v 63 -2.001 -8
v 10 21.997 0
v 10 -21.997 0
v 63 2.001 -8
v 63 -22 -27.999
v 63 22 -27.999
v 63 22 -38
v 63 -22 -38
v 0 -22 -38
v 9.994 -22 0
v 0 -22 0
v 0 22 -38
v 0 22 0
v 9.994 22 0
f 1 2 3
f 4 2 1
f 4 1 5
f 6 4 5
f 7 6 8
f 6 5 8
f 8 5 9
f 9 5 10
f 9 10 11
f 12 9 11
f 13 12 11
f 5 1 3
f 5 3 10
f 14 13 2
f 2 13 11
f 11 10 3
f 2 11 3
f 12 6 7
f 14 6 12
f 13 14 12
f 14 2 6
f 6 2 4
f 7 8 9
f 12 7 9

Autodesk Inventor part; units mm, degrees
ref_plane "YZ Plane" through (0, 0, 0) normal (1, 0, 0) x (0, 1, 0)
ref_plane "XZ Plane" through (0, 0, 0) normal (0, 1, 0) x (-1, 0, 0)
sketch "草圖1" plane through (0, 0, 0) normal (0, 1, 0) x (-1, 0, 0)
  line L0 (0, 0) -> (-63, 0)
  line L1 (-63, 0) -> (-63, -38)
  line L2 (-63, -38) -> (0, -38)
  line L3 (0, -38) -> (0, 0)
  dimension "d0" = 63
  dimension "d1" = 38
extrude "擠出1" add sketch "草圖1" along normal mid plane 44
sketch "草圖2" plane through (0, 22, 0) normal (0, 1, 0) x (1, 0, 0)
  line L0 (0, 0) -> (63, 0) projected
  line L1 (10, 0) -> (63, 8)
  line L2 (63, 0) -> (63, 38) projected
  dimension "d4" = 10
  dimension "d5" = 30
extrude "擠出2" cut sketch "草圖2" against normal blind 60
sketch "草圖3" plane through (63, -22, -38) normal (1, 0, 0) x (0, 0, -1)
  line L0 (-30, 24) -> (-10, 44)
  line L1 (0, 44) -> (-38, 44) projected
  line L2 (-30, 44) -> (-30, 0) projected
  point P0 (-38, 22)
  point P1 (-30, 2)
  dimension "d8" = 20
  dimension "d9" = 20
ref_plane "工作平面1" through (10, 22, 0) normal (-0.3499, -0.6624, -0.6624) x (0.8842, 0, -0.4671)
sketch "草圖4" plane through (10, 22, 0) normal (-0.3499, -0.6624, -0.6624) x (0.8842, 0, -0.4671)
  line L0 (-15.1543, -12.3218) -> (93.717, -12.3218)
  line L1 (93.717, -12.3218) -> (93.717, 28.8166)
  line L2 (93.717, 28.8166) -> (-15.1543, 28.8166)
  line L3 (-15.1543, 28.8166) -> (-15.1543, -12.3218)
  point P0 (-8.8419, 13.3872)
extrude "擠出3" cut sketch "草圖4" against normal blind 40
mirror "鏡射1" about plane through (0, 0, 0) normal (0, 1, 0) of "擠出3"
properties part number "54"
